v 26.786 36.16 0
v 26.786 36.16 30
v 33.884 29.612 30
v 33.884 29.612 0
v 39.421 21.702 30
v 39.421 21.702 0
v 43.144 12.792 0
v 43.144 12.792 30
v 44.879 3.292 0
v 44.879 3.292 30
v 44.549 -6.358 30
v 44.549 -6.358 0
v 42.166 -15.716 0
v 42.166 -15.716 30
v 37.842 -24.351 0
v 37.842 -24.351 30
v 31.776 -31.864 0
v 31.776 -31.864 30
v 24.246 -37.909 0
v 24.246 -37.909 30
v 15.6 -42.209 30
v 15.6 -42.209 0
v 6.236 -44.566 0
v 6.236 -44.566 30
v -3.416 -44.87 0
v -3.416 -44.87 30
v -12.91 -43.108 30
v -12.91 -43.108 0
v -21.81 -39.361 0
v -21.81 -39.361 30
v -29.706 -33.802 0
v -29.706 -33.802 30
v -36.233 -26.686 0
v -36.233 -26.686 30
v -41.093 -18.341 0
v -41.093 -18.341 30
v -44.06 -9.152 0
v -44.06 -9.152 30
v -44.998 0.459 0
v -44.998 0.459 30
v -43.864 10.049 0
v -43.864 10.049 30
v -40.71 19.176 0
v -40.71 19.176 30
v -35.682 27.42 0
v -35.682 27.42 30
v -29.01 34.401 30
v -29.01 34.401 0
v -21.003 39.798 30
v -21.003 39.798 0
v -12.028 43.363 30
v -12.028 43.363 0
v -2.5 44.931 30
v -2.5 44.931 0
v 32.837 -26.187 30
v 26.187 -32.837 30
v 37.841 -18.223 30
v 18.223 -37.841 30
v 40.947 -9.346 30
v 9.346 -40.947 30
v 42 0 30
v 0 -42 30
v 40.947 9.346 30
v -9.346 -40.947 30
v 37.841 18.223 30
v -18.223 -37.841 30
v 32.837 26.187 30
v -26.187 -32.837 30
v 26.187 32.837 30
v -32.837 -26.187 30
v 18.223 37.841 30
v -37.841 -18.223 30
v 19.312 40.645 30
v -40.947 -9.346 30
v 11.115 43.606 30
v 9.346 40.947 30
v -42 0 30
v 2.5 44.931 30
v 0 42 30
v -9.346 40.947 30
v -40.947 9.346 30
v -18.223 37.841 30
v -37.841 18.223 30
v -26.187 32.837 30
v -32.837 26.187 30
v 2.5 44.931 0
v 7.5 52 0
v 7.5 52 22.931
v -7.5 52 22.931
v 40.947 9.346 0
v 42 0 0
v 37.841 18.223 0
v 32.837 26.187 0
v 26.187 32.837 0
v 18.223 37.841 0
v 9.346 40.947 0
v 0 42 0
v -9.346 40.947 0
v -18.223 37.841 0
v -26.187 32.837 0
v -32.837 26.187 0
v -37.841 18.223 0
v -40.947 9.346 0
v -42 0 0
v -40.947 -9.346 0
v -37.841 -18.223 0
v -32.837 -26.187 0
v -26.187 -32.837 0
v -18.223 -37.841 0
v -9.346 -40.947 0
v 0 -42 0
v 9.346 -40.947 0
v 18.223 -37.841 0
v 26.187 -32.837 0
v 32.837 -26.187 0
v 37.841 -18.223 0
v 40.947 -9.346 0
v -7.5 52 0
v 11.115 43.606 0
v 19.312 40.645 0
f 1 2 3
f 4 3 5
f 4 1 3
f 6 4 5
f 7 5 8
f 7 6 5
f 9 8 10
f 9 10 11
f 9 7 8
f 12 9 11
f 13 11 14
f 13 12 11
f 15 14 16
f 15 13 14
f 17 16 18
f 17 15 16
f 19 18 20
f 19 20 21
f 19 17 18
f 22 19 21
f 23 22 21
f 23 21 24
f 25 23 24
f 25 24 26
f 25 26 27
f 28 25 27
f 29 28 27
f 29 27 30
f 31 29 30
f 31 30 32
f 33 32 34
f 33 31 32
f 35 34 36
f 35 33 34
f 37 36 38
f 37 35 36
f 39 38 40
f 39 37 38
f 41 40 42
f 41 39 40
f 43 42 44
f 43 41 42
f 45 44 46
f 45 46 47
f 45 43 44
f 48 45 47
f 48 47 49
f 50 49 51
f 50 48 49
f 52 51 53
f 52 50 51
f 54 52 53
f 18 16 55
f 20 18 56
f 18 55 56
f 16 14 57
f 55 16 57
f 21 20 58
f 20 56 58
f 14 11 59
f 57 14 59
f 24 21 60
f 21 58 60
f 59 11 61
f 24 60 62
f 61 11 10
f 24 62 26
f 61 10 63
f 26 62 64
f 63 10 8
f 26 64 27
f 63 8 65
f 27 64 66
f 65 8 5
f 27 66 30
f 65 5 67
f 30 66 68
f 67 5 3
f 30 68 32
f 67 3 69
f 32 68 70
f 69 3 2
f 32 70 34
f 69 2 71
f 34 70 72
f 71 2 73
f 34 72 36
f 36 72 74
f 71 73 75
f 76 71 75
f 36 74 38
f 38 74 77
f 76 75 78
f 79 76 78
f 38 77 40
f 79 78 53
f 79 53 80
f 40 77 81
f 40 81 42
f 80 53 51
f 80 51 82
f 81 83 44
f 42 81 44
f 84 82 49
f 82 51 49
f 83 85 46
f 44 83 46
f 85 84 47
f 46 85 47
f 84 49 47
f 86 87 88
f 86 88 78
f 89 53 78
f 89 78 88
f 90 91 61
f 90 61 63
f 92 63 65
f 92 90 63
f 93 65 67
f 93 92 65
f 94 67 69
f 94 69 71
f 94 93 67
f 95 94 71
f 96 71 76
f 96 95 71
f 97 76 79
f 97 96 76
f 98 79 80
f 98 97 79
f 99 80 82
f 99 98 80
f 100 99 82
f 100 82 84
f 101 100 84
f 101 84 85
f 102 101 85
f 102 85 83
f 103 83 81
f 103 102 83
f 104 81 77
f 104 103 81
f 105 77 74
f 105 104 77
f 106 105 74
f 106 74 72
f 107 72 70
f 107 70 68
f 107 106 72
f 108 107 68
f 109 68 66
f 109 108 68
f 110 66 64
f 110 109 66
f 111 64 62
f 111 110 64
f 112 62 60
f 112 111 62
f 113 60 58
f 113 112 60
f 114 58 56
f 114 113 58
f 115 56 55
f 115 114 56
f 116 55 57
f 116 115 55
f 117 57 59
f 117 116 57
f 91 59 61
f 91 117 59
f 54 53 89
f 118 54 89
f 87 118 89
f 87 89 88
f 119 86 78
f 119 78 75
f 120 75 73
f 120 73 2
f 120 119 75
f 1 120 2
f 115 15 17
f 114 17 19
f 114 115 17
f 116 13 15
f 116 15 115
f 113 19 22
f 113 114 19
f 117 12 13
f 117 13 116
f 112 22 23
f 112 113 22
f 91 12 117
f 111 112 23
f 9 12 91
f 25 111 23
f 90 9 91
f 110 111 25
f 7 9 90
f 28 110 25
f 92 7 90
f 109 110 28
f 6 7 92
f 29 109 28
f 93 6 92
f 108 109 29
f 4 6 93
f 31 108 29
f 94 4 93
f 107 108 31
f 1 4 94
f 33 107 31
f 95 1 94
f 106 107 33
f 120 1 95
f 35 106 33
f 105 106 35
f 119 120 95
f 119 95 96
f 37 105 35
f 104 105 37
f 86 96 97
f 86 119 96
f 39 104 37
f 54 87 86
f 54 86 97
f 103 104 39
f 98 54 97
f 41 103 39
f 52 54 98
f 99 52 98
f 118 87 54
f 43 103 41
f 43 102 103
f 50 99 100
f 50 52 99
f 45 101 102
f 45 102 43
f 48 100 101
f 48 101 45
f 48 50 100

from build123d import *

# Parameters (mm, degrees)
SKETCH1_R                      = 42
BOSS_EXTRUDE1_DEPTH            = 30
CUT_EXTRUDE1_REACH             = 47
CUT_EXTRUDE1_DIRECTION_2_REACH = 47


with BuildPart() as part:
    # Sketch1 → Boss-Extrude1 (new body)
    with BuildSketch(Plane.XY):
        with BuildLine():
            ThreePointArc((2.5, 44.930501889), (15.285447634, 42.324403016), (26.785714286, 36.159722209))
            ThreePointArc((26.785714286, 36.159722209), (-12.910485027, -43.108228639), (-2.5, 44.930501889))
            Line((-2.5, 44.930501889), (-7.5, 52))
            Line((-7.5, 52), (7.5, 52))
            Line((7.5, 52), (2.5, 44.930501889))
        make_face()
        Circle(SKETCH1_R, mode=Mode.SUBTRACT)
    extrude(amount=BOSS_EXTRUDE1_DEPTH)

    # Cut-Extrude1: up to this face of the body (flat: up to its plane)
    cut_extrude1_end = Plane(part.part.faces().sort_by_distance((-5, 48.465250945, 15))[0])
    # Sketch3 → Cut-Extrude1 (cut, up to the picked face)
    with BuildSketch(Plane(origin=(0, 0, 0), x_dir=(0, 0, -1), z_dir=(1, 0, 0)), mode=Mode.PRIVATE) as cut_extrude1_sk1:
        Polygon((-30, 44.930501889), (-22.930501889, 52), (-30, 52), align=None)
    cut_extrude1_tool1 = split(extrude(cut_extrude1_sk1.sketch, amount=-CUT_EXTRUDE1_REACH, mode=Mode.PRIVATE), bisect_by=cut_extrude1_end, keep=Keep.BOTH, mode=Mode.PRIVATE)
    add(cut_extrude1_tool1.solids().sort_by_distance((0, 49.643501, 27.643501))[0], mode=Mode.SUBTRACT)

    # Cut-Extrude1 direction 2: up to this face of the body (flat: up to its plane)
    cut_extrude1_direction_2_end = Plane(part.part.faces().sort_by_distance((5, 48.465250945, 15))[0])
    # Sketch3 → Cut-Extrude1 direction 2 (cut, up to the picked face)
    with BuildSketch(Plane(origin=(0, 0, 0), x_dir=(0, 0, -1), z_dir=(1, 0, 0)), mode=Mode.PRIVATE) as cut_extrude1_direction_2_sk1:
        Polygon((-30, 44.930501889), (-22.930501889, 52), (-30, 52), align=None)
    cut_extrude1_direction_2_tool1 = split(extrude(cut_extrude1_direction_2_sk1.sketch, amount=CUT_EXTRUDE1_DIRECTION_2_REACH, mode=Mode.PRIVATE), bisect_by=cut_extrude1_direction_2_end, keep=Keep.BOTH, mode=Mode.PRIVATE)
    add(cut_extrude1_direction_2_tool1.solids().sort_by_distance((0, 49.643501, 27.643501))[0], mode=Mode.SUBTRACT)


solid = part.part
